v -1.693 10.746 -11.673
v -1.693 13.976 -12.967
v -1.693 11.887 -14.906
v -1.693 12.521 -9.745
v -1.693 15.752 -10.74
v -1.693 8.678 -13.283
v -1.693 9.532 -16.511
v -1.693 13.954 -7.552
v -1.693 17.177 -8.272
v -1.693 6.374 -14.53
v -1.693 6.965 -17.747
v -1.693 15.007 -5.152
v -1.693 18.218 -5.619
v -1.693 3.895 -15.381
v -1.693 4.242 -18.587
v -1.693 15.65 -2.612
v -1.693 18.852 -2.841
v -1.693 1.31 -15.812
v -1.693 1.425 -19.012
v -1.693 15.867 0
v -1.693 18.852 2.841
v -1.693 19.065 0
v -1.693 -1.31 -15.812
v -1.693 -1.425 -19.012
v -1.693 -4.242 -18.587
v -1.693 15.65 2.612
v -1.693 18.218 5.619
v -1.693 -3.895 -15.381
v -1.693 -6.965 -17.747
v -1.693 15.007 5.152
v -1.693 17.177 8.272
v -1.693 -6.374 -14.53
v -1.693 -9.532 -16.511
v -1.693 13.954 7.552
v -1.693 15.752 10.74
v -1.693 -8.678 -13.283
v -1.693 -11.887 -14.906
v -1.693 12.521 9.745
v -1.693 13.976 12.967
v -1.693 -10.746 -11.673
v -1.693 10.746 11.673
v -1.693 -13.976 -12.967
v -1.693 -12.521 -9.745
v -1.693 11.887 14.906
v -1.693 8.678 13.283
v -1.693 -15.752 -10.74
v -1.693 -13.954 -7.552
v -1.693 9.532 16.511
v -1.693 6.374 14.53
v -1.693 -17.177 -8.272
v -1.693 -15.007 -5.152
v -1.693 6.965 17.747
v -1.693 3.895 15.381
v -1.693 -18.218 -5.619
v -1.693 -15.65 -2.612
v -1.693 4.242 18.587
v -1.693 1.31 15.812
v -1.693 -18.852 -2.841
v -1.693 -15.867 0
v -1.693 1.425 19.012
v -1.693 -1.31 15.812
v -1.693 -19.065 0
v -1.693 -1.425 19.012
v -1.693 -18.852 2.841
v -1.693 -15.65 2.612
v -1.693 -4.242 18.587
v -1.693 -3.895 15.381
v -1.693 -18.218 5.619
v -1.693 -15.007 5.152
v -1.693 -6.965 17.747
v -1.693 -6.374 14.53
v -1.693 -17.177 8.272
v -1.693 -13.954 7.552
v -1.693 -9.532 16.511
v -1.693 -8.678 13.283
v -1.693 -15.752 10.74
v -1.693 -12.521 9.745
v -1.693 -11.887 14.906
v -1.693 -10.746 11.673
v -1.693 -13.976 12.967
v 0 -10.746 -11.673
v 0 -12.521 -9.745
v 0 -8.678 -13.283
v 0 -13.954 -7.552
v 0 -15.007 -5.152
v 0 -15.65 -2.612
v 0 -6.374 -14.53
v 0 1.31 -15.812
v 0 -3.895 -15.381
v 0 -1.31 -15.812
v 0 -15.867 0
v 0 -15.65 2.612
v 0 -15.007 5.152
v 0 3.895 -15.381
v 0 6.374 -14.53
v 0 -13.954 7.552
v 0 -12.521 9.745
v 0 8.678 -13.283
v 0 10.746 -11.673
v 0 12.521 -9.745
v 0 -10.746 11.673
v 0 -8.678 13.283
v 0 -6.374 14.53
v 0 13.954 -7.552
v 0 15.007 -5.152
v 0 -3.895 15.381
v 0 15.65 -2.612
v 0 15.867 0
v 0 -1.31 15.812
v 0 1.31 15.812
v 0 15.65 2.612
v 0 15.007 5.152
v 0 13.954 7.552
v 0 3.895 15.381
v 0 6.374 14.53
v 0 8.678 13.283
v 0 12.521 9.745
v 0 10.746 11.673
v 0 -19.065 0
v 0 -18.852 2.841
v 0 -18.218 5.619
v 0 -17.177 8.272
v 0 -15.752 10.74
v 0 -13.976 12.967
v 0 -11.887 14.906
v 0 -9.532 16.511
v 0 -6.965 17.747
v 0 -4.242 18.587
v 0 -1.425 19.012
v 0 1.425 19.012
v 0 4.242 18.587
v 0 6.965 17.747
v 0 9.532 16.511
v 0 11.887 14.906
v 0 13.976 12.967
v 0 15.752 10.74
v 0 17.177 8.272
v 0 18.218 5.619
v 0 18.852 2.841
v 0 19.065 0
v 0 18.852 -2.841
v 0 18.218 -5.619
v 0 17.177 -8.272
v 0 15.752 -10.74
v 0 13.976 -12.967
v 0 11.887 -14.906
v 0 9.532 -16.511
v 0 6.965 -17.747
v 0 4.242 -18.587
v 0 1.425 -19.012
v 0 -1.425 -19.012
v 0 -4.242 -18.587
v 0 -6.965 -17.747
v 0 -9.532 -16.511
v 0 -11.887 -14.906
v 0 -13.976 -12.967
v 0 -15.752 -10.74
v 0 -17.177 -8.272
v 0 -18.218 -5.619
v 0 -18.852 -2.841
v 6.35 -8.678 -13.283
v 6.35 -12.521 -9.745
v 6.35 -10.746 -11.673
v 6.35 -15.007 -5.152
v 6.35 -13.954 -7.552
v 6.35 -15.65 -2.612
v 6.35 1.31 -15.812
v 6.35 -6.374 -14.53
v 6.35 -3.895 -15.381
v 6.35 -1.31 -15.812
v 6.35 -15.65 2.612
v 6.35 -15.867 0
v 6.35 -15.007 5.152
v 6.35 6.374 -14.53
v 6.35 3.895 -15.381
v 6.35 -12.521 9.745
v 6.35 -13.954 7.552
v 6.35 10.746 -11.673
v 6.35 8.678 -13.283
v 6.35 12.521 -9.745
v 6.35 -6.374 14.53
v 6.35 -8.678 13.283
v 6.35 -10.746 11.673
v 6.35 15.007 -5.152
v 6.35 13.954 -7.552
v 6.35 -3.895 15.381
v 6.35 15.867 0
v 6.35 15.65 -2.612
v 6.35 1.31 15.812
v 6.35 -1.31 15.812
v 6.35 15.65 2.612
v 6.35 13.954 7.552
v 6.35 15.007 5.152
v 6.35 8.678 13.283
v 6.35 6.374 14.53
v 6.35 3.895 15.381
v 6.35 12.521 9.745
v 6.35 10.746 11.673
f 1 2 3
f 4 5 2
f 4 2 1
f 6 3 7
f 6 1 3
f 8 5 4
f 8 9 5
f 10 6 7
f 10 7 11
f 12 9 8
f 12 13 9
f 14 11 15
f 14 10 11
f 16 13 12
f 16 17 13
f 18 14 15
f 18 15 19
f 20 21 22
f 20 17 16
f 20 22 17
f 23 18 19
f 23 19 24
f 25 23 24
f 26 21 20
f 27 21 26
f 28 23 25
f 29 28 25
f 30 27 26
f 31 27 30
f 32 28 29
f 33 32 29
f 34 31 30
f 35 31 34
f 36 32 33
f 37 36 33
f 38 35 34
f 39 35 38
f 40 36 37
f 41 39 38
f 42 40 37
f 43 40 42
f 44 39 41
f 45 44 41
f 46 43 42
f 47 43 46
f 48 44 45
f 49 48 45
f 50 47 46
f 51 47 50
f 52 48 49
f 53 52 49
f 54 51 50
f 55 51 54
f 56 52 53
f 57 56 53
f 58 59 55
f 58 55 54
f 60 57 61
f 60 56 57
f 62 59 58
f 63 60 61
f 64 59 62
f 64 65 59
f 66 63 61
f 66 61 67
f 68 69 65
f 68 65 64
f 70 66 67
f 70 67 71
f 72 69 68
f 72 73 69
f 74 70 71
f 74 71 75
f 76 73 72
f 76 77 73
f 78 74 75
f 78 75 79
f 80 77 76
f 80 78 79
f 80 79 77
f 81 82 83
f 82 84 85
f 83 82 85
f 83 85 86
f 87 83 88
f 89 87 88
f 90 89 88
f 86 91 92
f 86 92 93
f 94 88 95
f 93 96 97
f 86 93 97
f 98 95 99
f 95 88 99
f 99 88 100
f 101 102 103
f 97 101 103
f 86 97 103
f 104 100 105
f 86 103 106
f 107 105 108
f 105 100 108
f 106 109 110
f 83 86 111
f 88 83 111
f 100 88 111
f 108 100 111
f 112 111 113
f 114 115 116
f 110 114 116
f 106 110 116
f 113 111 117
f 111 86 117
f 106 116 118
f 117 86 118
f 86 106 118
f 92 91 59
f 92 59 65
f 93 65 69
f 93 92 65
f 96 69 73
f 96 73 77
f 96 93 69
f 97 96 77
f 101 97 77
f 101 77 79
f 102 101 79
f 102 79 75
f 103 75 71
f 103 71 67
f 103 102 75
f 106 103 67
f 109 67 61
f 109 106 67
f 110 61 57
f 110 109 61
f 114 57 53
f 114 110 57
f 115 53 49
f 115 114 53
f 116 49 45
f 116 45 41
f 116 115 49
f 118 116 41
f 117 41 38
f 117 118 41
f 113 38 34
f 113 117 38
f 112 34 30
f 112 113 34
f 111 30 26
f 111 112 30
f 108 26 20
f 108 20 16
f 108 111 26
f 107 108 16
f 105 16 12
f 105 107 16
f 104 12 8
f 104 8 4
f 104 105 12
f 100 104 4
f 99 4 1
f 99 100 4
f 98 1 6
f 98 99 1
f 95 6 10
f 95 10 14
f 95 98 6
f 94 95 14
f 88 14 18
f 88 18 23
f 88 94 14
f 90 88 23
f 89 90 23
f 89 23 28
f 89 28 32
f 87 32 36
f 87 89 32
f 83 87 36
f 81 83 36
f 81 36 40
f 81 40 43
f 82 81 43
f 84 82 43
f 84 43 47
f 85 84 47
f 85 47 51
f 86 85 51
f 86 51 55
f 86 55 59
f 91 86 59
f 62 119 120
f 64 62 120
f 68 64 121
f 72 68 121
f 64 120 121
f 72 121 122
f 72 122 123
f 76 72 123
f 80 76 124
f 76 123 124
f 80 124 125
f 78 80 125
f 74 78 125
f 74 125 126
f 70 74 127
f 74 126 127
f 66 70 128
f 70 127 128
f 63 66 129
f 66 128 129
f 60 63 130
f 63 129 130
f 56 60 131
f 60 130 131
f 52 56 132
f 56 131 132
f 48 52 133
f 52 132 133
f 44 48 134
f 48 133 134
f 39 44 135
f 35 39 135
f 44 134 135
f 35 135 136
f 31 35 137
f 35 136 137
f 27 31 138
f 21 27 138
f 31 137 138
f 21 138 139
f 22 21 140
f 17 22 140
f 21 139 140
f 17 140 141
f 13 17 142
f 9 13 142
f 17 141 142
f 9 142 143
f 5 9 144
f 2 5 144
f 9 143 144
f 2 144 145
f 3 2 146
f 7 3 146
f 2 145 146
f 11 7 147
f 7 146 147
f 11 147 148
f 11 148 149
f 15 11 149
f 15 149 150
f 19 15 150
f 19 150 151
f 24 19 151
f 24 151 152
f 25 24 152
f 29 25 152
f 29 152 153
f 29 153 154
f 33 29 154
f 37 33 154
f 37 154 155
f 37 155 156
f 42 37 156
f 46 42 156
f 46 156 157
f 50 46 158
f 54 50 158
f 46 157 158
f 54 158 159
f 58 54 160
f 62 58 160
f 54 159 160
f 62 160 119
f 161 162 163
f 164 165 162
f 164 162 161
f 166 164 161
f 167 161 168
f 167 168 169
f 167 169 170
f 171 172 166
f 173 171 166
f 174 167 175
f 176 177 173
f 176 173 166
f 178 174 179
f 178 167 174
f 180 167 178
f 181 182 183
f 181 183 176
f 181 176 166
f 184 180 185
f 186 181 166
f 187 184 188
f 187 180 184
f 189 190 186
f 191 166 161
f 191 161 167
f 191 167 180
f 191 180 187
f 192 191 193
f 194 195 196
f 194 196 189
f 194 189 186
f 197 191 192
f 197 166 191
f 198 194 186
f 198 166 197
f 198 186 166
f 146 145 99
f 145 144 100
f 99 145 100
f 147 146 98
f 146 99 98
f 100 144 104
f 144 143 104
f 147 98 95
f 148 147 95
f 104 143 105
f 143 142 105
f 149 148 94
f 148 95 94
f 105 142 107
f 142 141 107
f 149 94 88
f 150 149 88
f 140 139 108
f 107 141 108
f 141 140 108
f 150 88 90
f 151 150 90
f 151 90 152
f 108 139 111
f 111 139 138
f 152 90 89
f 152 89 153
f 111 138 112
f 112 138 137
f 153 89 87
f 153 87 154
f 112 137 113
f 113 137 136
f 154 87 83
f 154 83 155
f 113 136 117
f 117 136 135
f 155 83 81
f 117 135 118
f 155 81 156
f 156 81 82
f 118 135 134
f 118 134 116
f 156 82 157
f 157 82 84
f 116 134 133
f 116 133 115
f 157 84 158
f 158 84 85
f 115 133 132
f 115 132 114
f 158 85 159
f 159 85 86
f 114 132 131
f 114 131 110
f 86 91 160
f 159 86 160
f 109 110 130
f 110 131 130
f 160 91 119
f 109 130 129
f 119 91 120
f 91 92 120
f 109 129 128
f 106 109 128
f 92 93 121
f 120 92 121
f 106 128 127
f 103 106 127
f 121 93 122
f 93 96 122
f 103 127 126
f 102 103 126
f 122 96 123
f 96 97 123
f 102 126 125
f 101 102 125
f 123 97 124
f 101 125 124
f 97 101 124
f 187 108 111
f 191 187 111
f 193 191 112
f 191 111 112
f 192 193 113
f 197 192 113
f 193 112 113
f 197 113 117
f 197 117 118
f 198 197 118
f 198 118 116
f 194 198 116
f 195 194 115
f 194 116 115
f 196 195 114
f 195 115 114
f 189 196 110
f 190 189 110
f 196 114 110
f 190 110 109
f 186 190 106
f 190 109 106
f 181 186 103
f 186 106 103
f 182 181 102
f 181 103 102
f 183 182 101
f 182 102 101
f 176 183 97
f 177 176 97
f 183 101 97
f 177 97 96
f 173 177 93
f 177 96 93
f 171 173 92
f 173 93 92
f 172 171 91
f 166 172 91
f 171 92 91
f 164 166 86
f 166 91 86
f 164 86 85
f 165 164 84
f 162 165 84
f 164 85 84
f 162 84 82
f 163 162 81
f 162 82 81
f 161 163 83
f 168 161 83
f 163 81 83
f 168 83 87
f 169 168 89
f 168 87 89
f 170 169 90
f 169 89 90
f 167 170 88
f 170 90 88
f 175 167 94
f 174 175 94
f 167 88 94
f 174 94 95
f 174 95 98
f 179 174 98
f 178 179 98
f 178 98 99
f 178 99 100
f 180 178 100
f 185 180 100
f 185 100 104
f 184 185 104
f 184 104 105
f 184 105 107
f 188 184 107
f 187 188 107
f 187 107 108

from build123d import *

# Parameters (mm, degrees)
F0_R     = 15.8665178104
F1_DEPTH = 6.35
F2_R     = 19.064952095
F2_R_2   = 15.8665178104
F3_DEPTH = 1.6933333333


# Not quite as in the source:
# - a length typed as a fraction of an inch, garbled in the dataset ("3 / 203.2 mm" for 3/8 in), is restored


with BuildPart() as f1:
    # F0 (on Right) → F1 (new body)
    with BuildSketch(Plane.YZ):
        Circle(F0_R)
    extrude(amount=F1_DEPTH)


with BuildPart() as f3:
    # F2 (on face) → F3 (new body)
    with BuildSketch(Plane(origin=(0, 0, 0), x_dir=(0, -1, 0), z_dir=(-1, 0, 0))):
        Circle(F2_R)
        Circle(F2_R_2, mode=Mode.SUBTRACT)
    extrude(amount=F3_DEPTH)


solid = Compound([f1.part, f3.part])
